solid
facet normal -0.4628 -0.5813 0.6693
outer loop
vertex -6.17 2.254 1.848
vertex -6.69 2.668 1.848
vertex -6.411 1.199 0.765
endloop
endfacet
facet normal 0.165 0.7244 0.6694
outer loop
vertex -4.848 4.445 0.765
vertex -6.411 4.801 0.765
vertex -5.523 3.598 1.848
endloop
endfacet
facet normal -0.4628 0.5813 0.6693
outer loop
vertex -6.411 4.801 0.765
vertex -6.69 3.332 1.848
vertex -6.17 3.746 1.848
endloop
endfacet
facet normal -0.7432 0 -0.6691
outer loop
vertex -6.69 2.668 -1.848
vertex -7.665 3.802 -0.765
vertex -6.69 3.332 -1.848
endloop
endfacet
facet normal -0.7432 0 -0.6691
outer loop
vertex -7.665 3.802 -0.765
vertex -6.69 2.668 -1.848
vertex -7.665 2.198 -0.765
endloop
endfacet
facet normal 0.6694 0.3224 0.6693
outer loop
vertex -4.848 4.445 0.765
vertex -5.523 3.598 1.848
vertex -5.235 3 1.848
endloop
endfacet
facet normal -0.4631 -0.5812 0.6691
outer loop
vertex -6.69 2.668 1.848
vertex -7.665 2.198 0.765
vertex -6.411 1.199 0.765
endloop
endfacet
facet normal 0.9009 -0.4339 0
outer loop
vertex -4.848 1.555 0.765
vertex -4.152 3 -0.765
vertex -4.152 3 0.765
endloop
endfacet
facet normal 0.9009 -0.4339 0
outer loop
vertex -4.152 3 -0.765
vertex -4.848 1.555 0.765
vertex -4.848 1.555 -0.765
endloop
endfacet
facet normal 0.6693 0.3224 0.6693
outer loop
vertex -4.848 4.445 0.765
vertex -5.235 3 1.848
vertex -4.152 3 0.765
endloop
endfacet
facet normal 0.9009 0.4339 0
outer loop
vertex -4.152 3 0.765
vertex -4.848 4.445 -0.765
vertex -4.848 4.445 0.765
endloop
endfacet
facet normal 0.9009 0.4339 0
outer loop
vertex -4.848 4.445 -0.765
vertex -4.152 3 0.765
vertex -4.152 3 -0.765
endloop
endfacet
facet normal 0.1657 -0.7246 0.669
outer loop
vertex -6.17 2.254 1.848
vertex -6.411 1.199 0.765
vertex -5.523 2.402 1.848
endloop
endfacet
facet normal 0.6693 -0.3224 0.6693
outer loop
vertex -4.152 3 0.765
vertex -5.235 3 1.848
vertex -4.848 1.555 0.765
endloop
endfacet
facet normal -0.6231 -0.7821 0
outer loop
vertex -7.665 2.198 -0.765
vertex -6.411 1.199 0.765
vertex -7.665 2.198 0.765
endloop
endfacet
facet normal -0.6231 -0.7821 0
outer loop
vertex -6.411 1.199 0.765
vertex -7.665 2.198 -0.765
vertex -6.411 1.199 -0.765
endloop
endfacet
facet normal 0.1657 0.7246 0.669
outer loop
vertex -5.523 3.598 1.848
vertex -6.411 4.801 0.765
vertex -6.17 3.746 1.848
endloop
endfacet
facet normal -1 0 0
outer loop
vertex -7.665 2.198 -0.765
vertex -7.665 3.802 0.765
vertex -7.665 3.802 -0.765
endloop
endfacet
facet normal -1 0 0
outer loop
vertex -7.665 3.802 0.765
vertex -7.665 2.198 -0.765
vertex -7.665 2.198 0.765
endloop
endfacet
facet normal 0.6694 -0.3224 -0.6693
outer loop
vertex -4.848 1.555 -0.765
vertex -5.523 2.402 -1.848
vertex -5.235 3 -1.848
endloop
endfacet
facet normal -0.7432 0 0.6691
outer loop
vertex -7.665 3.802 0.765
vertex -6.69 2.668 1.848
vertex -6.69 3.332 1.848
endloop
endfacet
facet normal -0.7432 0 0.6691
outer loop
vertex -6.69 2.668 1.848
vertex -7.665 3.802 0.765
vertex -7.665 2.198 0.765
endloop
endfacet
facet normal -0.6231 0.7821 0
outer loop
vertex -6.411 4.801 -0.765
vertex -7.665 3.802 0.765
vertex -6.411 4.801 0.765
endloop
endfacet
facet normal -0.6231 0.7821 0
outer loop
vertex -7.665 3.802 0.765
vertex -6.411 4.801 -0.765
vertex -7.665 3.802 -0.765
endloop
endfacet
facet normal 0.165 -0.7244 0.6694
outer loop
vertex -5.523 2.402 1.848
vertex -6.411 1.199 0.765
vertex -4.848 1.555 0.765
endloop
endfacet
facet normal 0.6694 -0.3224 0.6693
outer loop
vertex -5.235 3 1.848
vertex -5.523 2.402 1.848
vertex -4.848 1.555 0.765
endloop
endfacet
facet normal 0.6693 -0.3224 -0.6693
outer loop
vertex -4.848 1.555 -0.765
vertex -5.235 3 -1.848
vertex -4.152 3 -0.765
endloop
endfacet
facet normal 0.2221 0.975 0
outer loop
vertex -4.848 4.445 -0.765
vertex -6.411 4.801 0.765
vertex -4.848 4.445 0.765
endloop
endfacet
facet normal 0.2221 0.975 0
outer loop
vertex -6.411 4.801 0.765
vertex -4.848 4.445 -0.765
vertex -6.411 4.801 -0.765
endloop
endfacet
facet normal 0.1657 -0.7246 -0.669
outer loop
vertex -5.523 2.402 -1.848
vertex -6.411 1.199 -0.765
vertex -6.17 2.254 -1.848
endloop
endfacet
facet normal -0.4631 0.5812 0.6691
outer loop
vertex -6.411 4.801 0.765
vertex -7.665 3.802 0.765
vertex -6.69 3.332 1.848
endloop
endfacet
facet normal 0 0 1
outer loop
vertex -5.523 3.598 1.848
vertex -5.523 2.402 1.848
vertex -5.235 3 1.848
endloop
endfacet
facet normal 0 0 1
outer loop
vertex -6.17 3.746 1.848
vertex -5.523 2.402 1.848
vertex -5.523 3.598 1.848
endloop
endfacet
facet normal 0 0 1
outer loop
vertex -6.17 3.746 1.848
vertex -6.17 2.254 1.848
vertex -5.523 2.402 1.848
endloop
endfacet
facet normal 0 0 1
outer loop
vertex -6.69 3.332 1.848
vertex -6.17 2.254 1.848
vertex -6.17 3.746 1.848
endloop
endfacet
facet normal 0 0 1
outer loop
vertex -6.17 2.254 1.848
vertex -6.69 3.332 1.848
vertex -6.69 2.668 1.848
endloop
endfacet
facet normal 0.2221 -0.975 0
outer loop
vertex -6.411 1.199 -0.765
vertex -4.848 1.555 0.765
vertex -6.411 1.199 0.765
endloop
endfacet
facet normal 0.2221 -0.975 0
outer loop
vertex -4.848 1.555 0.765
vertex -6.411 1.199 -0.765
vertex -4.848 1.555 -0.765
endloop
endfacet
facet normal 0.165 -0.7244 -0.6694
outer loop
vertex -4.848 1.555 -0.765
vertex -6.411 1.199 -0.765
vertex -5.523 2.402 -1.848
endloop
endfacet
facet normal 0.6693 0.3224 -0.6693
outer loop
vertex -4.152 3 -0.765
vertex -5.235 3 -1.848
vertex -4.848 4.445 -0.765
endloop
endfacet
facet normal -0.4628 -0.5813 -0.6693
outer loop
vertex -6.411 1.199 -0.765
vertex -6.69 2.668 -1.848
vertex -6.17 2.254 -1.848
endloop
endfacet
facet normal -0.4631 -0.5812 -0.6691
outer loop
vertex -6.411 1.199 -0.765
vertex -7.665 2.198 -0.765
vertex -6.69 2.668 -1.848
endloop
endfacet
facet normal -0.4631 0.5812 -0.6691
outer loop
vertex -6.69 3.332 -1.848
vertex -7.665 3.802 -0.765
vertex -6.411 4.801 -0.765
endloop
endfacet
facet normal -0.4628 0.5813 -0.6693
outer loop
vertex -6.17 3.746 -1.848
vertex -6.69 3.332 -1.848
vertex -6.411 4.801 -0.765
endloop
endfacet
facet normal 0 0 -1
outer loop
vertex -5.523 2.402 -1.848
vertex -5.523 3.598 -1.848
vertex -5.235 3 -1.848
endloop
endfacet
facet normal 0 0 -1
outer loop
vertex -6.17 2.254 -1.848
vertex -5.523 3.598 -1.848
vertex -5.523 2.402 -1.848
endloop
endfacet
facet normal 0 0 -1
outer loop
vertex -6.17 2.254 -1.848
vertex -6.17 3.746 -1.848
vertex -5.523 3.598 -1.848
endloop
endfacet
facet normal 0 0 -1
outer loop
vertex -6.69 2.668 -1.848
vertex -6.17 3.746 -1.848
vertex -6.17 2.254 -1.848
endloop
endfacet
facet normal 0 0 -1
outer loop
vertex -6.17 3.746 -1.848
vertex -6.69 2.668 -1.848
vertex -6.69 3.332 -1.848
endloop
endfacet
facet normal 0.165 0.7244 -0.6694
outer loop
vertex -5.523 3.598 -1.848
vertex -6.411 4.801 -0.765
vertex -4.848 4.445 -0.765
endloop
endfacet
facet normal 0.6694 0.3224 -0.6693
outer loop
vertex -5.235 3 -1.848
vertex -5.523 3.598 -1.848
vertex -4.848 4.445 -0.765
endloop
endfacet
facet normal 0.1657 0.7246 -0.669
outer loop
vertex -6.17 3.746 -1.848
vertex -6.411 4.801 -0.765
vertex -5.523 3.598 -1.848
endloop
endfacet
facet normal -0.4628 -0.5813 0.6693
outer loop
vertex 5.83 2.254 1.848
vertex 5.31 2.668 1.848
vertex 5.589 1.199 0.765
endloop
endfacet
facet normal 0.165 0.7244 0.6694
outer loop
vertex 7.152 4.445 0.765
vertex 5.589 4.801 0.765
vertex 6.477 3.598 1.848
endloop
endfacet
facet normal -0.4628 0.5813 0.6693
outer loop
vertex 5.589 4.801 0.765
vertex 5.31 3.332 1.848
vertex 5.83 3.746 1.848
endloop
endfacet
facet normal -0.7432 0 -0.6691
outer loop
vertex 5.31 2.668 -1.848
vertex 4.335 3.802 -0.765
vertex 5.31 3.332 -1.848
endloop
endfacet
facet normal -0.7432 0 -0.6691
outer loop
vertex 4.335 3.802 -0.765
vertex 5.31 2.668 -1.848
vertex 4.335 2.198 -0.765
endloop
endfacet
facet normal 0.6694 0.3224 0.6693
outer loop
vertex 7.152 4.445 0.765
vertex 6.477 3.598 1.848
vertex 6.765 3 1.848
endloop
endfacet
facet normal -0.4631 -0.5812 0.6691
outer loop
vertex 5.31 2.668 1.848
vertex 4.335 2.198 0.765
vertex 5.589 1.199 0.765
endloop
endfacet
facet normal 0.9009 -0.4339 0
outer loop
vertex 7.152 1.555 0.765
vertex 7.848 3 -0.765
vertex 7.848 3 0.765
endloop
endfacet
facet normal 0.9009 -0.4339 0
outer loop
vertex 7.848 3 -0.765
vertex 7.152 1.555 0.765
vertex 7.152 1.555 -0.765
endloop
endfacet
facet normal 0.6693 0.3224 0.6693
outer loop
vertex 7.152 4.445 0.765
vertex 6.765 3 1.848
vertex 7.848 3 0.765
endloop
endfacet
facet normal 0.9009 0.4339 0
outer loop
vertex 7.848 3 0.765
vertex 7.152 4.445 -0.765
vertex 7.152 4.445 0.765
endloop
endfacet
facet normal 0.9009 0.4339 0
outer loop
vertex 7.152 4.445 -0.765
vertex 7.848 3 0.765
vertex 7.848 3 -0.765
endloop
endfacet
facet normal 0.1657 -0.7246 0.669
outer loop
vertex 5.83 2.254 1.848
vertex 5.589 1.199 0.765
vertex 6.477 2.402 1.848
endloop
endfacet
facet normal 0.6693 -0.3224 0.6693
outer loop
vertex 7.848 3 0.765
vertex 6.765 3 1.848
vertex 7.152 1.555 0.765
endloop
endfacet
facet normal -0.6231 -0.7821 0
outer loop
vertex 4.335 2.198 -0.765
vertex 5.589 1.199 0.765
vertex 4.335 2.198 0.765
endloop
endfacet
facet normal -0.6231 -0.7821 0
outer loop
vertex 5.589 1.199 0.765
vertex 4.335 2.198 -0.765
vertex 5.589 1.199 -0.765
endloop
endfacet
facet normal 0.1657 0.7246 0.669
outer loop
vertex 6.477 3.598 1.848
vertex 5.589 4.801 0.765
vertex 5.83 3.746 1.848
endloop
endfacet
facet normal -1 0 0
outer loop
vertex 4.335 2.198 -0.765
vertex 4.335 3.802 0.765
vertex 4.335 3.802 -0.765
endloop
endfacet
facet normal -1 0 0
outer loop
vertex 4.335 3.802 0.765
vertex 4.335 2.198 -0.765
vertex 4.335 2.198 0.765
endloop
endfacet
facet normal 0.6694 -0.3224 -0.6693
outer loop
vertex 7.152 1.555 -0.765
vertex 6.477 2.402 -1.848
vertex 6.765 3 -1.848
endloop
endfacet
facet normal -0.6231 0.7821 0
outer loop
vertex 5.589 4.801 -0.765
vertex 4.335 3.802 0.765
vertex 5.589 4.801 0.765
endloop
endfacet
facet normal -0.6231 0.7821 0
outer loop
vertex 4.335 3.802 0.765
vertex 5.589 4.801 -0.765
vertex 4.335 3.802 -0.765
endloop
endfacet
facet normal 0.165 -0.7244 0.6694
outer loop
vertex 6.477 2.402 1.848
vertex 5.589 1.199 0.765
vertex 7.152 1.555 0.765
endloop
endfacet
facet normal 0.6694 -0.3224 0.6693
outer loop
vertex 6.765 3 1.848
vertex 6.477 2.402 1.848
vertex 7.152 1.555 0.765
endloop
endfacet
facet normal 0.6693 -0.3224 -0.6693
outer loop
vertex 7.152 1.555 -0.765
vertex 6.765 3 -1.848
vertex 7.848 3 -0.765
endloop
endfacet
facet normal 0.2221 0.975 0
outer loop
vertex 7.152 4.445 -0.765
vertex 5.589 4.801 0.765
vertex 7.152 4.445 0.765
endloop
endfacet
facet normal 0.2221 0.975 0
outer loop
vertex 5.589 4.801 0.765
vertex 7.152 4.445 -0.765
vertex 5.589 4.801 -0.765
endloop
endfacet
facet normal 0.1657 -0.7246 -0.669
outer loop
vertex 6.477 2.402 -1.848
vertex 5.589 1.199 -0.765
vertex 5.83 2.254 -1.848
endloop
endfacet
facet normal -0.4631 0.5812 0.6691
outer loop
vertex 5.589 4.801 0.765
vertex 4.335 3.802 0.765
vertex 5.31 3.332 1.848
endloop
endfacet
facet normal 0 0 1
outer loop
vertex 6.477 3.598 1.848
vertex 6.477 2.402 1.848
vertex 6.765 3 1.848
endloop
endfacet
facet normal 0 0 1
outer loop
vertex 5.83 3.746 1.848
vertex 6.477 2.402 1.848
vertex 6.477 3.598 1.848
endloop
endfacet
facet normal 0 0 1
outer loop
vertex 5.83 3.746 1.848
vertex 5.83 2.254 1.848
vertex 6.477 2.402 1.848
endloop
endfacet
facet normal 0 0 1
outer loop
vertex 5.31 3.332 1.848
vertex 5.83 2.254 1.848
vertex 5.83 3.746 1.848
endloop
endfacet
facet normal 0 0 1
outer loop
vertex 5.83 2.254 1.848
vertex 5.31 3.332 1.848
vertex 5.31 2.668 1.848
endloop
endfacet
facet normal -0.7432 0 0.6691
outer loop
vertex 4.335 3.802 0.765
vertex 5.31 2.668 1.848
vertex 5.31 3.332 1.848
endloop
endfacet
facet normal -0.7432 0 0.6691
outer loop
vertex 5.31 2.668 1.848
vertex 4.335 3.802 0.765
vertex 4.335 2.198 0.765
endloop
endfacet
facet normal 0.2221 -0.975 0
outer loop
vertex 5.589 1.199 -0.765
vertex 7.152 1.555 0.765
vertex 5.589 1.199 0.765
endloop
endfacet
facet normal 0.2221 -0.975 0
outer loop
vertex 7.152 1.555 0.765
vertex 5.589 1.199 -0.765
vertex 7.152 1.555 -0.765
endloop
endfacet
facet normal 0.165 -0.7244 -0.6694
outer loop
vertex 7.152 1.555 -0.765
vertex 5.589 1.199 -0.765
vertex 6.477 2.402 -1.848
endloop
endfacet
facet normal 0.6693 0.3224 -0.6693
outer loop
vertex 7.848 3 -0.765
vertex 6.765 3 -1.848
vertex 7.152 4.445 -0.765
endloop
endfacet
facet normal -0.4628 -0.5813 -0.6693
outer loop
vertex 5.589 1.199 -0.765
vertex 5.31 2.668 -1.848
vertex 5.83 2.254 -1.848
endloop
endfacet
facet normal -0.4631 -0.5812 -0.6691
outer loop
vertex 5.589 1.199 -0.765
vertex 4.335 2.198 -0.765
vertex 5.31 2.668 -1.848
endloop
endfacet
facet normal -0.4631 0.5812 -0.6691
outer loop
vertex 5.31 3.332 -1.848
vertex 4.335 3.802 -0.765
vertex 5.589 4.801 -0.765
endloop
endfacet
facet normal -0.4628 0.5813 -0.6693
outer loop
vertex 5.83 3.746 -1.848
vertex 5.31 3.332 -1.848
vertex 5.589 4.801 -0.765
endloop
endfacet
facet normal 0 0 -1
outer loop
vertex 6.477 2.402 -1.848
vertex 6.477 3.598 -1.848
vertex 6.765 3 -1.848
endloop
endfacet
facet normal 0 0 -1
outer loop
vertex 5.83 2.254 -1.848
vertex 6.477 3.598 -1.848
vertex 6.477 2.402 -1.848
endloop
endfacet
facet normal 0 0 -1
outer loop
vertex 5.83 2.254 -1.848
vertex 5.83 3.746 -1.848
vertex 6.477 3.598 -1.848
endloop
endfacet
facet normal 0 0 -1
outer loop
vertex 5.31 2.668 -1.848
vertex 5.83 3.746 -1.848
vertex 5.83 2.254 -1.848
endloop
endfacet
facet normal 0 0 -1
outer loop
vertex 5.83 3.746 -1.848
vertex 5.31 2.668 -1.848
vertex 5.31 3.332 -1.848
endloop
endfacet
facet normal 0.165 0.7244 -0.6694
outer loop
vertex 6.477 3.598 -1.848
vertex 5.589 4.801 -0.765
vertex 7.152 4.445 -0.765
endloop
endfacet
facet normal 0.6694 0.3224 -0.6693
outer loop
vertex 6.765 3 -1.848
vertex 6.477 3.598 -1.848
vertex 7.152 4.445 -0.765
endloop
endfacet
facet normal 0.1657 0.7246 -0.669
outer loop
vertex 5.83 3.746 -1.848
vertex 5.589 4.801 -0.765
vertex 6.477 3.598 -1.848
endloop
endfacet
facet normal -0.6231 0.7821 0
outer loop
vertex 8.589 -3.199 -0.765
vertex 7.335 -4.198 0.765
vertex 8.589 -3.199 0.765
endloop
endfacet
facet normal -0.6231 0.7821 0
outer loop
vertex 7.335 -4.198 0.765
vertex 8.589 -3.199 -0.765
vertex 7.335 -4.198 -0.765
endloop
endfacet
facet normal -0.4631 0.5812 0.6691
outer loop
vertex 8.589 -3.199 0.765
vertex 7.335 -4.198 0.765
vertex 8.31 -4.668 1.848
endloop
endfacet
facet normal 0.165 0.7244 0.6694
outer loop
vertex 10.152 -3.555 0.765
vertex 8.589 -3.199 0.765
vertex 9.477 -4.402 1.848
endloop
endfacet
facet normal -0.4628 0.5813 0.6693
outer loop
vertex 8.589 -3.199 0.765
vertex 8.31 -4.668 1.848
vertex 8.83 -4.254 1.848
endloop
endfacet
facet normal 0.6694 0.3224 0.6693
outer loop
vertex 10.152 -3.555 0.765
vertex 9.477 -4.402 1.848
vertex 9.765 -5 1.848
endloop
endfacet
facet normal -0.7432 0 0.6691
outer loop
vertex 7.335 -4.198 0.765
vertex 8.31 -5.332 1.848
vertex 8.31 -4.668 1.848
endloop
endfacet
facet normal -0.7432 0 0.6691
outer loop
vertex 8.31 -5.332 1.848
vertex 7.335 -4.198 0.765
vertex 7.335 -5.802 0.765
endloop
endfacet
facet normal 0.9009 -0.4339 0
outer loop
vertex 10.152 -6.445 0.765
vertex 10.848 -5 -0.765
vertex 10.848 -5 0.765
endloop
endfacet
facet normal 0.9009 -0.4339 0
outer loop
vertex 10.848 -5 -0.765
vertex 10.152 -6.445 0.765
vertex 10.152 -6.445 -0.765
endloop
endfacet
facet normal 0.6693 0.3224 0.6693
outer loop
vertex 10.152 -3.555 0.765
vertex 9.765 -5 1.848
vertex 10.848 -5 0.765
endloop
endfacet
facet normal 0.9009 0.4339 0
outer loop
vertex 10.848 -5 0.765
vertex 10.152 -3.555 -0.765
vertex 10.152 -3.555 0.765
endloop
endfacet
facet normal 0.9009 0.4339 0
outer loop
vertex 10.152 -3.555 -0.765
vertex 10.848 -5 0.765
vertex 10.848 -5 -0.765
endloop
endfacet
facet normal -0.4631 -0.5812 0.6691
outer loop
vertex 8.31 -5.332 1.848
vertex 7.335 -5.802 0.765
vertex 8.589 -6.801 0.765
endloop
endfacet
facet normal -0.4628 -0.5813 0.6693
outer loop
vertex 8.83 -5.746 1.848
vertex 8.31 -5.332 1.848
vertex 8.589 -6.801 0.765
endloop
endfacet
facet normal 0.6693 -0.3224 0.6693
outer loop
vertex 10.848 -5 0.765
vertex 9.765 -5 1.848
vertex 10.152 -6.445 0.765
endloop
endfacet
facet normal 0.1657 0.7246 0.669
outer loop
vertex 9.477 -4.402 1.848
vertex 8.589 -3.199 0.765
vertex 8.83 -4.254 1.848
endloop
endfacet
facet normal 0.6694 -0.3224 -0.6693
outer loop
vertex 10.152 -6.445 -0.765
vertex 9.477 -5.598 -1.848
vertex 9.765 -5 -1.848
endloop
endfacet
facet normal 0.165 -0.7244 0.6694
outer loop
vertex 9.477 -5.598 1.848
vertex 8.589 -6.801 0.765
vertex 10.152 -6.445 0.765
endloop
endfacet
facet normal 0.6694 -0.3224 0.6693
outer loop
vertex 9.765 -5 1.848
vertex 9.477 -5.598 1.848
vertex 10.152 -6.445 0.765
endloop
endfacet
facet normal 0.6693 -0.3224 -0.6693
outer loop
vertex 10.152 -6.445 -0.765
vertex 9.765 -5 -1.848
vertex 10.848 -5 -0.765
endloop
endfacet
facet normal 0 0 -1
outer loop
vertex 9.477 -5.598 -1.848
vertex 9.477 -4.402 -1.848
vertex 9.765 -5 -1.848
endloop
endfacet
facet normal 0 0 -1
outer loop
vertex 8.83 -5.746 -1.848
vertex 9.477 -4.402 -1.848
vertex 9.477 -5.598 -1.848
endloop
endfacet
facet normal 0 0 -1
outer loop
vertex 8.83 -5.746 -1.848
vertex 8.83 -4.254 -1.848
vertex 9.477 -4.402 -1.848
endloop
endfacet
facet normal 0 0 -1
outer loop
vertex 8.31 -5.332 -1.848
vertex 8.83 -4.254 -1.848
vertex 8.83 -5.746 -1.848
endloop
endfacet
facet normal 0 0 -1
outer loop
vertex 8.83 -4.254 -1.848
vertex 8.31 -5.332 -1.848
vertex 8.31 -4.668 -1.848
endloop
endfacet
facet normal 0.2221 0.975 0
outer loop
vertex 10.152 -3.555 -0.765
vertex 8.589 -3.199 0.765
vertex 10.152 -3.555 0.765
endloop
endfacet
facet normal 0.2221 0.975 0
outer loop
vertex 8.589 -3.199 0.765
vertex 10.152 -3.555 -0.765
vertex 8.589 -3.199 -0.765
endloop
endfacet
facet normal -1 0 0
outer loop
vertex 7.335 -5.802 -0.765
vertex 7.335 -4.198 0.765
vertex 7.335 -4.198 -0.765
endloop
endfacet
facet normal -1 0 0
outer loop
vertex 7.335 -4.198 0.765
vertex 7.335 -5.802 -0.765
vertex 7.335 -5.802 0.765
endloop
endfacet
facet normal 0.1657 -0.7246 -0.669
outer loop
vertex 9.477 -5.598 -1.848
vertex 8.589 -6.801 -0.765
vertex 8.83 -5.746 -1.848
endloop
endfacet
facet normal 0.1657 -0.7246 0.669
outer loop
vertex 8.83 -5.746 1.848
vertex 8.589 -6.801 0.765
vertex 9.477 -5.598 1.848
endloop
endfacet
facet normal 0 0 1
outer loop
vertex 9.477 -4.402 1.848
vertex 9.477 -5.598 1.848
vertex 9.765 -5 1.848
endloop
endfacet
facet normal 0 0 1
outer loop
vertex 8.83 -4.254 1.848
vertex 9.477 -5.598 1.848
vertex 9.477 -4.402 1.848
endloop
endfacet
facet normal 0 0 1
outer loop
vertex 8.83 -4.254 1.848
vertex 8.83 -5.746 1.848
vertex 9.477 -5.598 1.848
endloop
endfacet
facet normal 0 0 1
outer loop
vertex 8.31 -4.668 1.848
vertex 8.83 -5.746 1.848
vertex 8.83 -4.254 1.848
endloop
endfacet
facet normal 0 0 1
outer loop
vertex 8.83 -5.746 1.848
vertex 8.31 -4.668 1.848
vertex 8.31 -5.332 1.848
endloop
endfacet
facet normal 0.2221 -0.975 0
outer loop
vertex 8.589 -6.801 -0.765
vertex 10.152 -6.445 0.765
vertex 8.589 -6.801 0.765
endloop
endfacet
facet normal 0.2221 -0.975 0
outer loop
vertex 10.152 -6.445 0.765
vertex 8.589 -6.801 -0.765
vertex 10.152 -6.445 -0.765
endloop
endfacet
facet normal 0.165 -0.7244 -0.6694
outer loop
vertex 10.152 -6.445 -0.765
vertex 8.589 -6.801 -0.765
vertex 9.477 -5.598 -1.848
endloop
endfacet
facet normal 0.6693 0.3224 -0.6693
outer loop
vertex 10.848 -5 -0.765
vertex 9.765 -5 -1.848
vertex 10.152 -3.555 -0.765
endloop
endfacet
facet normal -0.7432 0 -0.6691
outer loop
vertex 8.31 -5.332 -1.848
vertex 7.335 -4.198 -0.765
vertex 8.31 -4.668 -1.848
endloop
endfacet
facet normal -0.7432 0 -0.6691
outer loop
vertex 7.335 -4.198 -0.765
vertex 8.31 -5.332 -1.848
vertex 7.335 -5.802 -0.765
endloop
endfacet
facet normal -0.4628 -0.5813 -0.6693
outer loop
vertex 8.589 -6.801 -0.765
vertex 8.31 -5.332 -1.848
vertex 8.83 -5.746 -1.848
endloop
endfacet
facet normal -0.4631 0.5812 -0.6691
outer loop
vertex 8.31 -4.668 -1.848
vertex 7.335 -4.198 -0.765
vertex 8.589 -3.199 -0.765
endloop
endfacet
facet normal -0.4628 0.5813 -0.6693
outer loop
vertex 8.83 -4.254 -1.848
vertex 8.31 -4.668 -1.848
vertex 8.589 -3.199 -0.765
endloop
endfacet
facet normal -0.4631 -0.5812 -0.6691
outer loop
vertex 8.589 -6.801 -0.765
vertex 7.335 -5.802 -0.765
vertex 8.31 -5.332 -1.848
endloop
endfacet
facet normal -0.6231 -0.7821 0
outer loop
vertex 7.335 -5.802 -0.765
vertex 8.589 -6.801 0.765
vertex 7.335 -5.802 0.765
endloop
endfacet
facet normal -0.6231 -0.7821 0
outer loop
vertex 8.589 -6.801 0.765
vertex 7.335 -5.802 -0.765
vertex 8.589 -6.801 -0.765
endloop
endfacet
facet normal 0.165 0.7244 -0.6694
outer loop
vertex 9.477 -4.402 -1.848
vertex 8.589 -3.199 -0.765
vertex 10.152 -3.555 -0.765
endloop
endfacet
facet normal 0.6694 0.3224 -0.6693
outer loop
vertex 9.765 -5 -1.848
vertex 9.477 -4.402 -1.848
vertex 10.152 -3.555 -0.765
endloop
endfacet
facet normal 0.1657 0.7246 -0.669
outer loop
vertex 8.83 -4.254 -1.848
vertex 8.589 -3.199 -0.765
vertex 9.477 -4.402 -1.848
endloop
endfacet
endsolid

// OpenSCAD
union() {
  translate([-6, 3, 0]) sphere(r=2);
  translate([6, 3, 0]) sphere(r=2);
  translate([9, -5, 0]) sphere(r=2);
}
